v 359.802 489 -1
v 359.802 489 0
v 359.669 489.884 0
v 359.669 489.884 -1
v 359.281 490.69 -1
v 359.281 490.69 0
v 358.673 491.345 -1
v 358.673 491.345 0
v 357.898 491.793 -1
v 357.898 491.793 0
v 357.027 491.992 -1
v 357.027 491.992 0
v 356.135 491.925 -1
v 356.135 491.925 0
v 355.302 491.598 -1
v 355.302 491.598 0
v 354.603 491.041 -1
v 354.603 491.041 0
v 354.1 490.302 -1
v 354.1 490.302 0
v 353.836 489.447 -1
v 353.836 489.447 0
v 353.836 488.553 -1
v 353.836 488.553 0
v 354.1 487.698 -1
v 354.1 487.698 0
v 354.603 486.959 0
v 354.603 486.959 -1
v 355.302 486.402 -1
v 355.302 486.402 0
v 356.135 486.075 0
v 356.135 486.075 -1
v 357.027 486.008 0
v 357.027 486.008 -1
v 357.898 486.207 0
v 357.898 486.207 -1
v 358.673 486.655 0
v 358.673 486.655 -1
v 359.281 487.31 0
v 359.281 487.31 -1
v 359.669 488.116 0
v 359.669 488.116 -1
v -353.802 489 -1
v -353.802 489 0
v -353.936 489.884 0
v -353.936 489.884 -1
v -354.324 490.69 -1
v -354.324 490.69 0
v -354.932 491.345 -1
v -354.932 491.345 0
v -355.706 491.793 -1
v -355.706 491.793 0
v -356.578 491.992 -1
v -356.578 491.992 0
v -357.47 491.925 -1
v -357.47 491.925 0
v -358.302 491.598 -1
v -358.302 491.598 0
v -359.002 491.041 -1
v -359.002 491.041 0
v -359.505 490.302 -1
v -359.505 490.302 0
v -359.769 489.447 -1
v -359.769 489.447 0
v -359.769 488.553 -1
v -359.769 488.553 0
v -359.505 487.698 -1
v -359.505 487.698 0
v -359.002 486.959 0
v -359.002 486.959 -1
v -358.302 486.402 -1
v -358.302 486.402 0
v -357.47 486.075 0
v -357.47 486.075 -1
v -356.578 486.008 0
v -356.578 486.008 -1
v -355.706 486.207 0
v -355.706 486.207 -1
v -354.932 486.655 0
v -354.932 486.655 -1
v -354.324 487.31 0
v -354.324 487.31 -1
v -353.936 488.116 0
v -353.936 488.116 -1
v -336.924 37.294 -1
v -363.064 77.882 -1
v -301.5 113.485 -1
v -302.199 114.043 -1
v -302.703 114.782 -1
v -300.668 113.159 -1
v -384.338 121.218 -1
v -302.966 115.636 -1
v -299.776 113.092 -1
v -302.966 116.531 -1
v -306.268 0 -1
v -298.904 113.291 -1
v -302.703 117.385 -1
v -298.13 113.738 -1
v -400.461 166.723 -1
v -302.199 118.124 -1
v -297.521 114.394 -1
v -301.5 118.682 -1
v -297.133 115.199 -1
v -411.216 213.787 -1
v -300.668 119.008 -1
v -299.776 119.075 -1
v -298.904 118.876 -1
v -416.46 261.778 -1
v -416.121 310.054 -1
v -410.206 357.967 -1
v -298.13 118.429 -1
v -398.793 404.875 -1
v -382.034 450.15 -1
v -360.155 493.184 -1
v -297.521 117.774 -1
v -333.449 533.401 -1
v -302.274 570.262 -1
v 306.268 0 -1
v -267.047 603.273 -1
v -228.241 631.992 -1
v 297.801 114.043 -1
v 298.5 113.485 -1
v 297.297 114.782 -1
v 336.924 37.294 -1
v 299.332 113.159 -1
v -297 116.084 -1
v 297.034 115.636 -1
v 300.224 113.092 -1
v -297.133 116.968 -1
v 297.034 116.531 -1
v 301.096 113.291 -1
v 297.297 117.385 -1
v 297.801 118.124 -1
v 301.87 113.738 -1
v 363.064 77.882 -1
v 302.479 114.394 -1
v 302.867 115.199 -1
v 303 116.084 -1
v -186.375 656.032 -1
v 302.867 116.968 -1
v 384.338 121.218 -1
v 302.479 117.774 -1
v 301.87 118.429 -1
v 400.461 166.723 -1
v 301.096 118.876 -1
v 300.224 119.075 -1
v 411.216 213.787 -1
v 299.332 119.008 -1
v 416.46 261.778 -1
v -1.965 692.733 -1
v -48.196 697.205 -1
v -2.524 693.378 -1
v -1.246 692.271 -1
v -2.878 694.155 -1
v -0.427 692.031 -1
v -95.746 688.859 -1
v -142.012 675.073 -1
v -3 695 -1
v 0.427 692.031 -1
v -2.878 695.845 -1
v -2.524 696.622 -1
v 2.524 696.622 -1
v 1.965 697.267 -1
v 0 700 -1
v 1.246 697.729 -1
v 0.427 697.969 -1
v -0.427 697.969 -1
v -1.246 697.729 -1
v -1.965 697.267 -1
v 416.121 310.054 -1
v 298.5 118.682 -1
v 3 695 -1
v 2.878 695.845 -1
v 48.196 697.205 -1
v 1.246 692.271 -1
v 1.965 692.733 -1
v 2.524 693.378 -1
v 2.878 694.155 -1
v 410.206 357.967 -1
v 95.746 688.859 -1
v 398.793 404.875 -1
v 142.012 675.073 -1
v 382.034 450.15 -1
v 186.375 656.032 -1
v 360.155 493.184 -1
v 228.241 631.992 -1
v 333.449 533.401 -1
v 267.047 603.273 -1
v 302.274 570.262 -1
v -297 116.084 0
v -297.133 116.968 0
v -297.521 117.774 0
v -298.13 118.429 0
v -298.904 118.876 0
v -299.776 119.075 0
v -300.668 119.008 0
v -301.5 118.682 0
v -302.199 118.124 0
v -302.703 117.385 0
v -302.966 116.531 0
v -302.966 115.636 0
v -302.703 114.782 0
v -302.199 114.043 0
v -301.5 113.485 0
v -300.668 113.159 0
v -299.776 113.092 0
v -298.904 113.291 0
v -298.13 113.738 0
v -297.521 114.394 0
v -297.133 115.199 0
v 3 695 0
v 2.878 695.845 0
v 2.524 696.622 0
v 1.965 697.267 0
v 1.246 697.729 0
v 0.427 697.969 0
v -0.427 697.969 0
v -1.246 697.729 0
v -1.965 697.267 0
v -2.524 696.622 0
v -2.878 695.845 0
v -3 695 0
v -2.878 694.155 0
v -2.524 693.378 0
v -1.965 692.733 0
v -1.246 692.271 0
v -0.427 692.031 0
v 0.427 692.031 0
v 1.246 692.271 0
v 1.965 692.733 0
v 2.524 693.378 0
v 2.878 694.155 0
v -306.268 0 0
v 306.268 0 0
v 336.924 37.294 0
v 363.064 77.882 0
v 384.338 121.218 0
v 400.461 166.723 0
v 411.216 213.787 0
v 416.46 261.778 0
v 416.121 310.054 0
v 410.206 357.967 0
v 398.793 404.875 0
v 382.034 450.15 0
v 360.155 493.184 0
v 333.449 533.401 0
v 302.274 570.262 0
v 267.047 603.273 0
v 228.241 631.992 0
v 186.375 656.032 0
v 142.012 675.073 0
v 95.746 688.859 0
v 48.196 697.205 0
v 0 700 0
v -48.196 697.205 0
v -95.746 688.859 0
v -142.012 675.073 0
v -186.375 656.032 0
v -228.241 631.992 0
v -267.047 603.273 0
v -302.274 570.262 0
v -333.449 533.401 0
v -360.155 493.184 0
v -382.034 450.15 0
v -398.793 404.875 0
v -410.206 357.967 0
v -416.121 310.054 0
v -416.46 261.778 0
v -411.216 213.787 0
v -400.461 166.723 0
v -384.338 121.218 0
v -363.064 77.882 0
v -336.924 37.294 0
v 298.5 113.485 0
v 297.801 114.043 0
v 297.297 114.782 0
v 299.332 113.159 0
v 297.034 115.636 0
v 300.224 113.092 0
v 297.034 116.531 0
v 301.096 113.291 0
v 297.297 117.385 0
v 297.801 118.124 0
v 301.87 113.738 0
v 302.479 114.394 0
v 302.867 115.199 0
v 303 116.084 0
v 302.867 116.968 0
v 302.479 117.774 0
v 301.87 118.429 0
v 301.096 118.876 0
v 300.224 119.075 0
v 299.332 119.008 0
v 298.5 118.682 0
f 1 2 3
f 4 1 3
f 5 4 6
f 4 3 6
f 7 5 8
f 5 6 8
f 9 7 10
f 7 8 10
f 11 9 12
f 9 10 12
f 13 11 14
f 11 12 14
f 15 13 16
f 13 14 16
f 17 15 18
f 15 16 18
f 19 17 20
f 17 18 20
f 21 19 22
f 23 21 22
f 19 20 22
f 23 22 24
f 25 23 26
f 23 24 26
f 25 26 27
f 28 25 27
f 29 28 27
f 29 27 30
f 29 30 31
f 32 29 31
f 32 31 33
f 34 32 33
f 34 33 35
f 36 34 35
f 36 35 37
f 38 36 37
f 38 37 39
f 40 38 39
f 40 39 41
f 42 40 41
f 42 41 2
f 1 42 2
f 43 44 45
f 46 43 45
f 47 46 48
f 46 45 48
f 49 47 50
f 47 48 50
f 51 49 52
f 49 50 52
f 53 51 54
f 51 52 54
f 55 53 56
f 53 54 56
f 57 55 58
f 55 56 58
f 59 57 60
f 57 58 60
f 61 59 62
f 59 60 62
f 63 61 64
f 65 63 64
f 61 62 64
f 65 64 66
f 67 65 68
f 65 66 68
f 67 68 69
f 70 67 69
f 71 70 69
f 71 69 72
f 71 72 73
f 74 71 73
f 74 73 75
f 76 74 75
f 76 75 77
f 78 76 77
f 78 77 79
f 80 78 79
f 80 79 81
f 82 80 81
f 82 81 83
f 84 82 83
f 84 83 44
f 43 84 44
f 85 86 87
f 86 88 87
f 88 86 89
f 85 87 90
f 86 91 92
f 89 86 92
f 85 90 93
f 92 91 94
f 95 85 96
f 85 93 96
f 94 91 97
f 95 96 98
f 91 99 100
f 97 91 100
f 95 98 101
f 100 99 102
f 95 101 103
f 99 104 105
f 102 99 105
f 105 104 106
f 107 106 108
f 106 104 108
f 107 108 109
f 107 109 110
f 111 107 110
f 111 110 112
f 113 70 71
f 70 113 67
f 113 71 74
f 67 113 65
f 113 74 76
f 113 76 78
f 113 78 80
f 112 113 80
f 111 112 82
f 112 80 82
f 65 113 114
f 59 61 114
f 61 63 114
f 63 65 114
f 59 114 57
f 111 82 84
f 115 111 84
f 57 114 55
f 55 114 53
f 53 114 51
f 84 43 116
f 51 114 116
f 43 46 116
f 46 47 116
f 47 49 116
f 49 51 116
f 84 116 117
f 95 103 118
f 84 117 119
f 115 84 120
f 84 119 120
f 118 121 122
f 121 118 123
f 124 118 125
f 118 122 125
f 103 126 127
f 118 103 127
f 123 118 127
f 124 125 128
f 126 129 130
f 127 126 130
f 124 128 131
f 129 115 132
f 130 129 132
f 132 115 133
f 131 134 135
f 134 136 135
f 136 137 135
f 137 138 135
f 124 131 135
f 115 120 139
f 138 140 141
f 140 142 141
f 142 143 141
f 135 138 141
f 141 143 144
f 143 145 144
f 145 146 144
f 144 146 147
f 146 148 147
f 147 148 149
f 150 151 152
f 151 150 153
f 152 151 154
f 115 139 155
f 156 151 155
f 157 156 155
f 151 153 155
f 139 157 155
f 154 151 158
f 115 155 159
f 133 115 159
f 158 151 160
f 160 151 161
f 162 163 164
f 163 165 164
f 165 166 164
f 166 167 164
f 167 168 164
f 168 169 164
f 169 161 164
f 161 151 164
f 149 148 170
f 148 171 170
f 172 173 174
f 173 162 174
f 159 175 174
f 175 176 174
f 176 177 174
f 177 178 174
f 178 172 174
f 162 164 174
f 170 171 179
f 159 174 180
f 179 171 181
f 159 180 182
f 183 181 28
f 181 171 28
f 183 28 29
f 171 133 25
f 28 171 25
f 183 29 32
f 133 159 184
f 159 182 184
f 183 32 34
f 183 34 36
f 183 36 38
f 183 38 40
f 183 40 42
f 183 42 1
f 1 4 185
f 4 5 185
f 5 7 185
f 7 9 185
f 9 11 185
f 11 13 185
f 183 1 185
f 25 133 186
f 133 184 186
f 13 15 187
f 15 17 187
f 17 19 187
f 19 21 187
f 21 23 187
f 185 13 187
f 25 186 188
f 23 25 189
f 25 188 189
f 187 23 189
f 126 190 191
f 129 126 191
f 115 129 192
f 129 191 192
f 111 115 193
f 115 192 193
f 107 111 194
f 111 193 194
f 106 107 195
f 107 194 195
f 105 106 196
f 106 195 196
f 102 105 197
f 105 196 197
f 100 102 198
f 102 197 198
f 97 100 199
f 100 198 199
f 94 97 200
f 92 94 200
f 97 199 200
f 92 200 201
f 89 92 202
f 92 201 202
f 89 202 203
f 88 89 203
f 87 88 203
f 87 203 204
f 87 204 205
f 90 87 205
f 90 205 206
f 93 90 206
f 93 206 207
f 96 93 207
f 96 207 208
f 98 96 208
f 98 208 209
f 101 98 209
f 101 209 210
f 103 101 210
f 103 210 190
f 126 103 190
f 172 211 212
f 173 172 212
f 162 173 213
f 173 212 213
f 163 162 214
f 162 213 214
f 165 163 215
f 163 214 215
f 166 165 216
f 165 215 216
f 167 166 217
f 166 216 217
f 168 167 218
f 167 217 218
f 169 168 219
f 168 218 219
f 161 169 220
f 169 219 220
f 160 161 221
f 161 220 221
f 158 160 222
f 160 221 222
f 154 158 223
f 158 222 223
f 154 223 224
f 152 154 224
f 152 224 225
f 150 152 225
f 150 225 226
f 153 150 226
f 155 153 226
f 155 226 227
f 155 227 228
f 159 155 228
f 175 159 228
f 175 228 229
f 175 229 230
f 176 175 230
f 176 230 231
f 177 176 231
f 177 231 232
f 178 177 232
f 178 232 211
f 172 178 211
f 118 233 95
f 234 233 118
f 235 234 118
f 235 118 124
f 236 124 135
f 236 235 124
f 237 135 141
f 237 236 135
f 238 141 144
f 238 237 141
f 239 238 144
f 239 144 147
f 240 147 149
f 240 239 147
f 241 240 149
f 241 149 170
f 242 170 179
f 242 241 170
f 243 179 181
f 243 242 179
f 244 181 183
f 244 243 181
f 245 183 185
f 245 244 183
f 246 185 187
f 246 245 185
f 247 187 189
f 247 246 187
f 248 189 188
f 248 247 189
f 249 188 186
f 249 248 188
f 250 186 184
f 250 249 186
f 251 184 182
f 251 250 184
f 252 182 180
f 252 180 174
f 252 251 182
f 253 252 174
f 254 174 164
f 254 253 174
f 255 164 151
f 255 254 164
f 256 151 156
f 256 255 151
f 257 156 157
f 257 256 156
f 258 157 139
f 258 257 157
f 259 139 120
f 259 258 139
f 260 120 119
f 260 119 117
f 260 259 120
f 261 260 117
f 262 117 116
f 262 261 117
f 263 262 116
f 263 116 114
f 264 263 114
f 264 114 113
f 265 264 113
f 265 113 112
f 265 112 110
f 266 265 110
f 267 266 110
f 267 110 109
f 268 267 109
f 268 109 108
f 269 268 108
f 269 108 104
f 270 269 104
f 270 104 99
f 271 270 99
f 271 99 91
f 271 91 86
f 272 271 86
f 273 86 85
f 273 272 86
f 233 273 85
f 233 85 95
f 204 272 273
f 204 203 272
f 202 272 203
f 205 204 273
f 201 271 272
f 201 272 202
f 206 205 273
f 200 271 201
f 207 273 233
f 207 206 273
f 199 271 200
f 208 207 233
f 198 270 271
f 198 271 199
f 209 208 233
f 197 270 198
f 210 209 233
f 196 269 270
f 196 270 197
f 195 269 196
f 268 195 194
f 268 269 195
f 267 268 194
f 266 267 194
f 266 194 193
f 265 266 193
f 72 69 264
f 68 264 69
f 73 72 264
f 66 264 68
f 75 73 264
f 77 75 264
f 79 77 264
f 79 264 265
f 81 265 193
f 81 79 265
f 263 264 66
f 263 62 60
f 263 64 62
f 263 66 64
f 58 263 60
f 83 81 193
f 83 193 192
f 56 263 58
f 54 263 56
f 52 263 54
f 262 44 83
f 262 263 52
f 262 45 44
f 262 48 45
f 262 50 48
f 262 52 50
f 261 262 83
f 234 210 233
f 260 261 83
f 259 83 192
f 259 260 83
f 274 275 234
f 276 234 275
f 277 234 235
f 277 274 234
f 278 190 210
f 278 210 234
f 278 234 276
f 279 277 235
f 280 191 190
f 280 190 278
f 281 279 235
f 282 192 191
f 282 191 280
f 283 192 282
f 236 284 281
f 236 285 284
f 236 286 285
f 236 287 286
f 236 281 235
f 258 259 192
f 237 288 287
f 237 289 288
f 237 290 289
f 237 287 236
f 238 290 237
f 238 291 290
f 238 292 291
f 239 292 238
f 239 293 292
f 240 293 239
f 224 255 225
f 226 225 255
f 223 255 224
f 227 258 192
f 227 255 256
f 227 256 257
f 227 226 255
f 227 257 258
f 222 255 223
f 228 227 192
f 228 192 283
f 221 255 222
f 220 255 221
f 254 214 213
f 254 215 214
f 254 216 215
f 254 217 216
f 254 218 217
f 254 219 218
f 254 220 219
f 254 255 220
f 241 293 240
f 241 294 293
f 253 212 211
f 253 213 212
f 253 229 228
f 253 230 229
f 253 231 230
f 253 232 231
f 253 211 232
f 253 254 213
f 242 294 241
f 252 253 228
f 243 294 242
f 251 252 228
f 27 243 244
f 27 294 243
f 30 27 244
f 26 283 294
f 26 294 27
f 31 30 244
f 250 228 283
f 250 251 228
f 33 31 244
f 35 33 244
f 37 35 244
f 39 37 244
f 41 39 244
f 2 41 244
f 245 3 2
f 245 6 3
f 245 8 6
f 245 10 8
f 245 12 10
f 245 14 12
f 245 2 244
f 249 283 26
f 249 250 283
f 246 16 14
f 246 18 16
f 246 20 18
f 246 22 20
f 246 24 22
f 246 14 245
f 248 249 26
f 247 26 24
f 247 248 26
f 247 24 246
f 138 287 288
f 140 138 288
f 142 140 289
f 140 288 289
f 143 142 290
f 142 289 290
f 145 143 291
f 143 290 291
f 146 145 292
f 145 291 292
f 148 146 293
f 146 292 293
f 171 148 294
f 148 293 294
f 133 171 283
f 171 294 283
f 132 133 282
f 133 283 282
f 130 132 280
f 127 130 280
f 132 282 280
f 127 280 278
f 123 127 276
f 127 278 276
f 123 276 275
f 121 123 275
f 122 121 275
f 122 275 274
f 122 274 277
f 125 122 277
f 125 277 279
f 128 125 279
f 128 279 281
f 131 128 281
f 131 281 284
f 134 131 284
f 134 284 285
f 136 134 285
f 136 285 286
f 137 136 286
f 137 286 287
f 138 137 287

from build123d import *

# Parameters (mm, degrees)
SM_BASE_FLANGE_1_DEPTH = 1
SKETCH_2_R             = 3
CUT_EXTRUDE_1_DEPTH    = 815.794452608


# Sheet-metal steps are written as plain solids
with BuildPart() as part:
    # Sketch 1 → Базовая кромка1 (new body)
    with BuildSketch(Plane.XY):
        with BuildLine():
            Line((-306.267856622, 0), (306.267856622, 0))
            ThreePointArc((306.267856622, 0), (0, 700), (-306.267856622, 0))
        make_face()
    extrude(amount=-SM_BASE_FLANGE_1_DEPTH)

    # Эскиз2 → Вырез-Вытянуть1 (cut, through all)
    with BuildSketch(Plane.XY):
        with Locations((-300, 116.083573562)):
            Circle(SKETCH_2_R)
        with Locations((300, 116.083573562)):
            Circle(SKETCH_2_R)
        with Locations((0, 695)):
            Circle(SKETCH_2_R)
        with Locations((356.802466359, 489)):
            Circle(SKETCH_2_R)
        with Locations((-356.802466359, 489)):
            Circle(SKETCH_2_R)
    extrude(amount=-CUT_EXTRUDE_1_DEPTH, mode=Mode.SUBTRACT)


solid = part.part
